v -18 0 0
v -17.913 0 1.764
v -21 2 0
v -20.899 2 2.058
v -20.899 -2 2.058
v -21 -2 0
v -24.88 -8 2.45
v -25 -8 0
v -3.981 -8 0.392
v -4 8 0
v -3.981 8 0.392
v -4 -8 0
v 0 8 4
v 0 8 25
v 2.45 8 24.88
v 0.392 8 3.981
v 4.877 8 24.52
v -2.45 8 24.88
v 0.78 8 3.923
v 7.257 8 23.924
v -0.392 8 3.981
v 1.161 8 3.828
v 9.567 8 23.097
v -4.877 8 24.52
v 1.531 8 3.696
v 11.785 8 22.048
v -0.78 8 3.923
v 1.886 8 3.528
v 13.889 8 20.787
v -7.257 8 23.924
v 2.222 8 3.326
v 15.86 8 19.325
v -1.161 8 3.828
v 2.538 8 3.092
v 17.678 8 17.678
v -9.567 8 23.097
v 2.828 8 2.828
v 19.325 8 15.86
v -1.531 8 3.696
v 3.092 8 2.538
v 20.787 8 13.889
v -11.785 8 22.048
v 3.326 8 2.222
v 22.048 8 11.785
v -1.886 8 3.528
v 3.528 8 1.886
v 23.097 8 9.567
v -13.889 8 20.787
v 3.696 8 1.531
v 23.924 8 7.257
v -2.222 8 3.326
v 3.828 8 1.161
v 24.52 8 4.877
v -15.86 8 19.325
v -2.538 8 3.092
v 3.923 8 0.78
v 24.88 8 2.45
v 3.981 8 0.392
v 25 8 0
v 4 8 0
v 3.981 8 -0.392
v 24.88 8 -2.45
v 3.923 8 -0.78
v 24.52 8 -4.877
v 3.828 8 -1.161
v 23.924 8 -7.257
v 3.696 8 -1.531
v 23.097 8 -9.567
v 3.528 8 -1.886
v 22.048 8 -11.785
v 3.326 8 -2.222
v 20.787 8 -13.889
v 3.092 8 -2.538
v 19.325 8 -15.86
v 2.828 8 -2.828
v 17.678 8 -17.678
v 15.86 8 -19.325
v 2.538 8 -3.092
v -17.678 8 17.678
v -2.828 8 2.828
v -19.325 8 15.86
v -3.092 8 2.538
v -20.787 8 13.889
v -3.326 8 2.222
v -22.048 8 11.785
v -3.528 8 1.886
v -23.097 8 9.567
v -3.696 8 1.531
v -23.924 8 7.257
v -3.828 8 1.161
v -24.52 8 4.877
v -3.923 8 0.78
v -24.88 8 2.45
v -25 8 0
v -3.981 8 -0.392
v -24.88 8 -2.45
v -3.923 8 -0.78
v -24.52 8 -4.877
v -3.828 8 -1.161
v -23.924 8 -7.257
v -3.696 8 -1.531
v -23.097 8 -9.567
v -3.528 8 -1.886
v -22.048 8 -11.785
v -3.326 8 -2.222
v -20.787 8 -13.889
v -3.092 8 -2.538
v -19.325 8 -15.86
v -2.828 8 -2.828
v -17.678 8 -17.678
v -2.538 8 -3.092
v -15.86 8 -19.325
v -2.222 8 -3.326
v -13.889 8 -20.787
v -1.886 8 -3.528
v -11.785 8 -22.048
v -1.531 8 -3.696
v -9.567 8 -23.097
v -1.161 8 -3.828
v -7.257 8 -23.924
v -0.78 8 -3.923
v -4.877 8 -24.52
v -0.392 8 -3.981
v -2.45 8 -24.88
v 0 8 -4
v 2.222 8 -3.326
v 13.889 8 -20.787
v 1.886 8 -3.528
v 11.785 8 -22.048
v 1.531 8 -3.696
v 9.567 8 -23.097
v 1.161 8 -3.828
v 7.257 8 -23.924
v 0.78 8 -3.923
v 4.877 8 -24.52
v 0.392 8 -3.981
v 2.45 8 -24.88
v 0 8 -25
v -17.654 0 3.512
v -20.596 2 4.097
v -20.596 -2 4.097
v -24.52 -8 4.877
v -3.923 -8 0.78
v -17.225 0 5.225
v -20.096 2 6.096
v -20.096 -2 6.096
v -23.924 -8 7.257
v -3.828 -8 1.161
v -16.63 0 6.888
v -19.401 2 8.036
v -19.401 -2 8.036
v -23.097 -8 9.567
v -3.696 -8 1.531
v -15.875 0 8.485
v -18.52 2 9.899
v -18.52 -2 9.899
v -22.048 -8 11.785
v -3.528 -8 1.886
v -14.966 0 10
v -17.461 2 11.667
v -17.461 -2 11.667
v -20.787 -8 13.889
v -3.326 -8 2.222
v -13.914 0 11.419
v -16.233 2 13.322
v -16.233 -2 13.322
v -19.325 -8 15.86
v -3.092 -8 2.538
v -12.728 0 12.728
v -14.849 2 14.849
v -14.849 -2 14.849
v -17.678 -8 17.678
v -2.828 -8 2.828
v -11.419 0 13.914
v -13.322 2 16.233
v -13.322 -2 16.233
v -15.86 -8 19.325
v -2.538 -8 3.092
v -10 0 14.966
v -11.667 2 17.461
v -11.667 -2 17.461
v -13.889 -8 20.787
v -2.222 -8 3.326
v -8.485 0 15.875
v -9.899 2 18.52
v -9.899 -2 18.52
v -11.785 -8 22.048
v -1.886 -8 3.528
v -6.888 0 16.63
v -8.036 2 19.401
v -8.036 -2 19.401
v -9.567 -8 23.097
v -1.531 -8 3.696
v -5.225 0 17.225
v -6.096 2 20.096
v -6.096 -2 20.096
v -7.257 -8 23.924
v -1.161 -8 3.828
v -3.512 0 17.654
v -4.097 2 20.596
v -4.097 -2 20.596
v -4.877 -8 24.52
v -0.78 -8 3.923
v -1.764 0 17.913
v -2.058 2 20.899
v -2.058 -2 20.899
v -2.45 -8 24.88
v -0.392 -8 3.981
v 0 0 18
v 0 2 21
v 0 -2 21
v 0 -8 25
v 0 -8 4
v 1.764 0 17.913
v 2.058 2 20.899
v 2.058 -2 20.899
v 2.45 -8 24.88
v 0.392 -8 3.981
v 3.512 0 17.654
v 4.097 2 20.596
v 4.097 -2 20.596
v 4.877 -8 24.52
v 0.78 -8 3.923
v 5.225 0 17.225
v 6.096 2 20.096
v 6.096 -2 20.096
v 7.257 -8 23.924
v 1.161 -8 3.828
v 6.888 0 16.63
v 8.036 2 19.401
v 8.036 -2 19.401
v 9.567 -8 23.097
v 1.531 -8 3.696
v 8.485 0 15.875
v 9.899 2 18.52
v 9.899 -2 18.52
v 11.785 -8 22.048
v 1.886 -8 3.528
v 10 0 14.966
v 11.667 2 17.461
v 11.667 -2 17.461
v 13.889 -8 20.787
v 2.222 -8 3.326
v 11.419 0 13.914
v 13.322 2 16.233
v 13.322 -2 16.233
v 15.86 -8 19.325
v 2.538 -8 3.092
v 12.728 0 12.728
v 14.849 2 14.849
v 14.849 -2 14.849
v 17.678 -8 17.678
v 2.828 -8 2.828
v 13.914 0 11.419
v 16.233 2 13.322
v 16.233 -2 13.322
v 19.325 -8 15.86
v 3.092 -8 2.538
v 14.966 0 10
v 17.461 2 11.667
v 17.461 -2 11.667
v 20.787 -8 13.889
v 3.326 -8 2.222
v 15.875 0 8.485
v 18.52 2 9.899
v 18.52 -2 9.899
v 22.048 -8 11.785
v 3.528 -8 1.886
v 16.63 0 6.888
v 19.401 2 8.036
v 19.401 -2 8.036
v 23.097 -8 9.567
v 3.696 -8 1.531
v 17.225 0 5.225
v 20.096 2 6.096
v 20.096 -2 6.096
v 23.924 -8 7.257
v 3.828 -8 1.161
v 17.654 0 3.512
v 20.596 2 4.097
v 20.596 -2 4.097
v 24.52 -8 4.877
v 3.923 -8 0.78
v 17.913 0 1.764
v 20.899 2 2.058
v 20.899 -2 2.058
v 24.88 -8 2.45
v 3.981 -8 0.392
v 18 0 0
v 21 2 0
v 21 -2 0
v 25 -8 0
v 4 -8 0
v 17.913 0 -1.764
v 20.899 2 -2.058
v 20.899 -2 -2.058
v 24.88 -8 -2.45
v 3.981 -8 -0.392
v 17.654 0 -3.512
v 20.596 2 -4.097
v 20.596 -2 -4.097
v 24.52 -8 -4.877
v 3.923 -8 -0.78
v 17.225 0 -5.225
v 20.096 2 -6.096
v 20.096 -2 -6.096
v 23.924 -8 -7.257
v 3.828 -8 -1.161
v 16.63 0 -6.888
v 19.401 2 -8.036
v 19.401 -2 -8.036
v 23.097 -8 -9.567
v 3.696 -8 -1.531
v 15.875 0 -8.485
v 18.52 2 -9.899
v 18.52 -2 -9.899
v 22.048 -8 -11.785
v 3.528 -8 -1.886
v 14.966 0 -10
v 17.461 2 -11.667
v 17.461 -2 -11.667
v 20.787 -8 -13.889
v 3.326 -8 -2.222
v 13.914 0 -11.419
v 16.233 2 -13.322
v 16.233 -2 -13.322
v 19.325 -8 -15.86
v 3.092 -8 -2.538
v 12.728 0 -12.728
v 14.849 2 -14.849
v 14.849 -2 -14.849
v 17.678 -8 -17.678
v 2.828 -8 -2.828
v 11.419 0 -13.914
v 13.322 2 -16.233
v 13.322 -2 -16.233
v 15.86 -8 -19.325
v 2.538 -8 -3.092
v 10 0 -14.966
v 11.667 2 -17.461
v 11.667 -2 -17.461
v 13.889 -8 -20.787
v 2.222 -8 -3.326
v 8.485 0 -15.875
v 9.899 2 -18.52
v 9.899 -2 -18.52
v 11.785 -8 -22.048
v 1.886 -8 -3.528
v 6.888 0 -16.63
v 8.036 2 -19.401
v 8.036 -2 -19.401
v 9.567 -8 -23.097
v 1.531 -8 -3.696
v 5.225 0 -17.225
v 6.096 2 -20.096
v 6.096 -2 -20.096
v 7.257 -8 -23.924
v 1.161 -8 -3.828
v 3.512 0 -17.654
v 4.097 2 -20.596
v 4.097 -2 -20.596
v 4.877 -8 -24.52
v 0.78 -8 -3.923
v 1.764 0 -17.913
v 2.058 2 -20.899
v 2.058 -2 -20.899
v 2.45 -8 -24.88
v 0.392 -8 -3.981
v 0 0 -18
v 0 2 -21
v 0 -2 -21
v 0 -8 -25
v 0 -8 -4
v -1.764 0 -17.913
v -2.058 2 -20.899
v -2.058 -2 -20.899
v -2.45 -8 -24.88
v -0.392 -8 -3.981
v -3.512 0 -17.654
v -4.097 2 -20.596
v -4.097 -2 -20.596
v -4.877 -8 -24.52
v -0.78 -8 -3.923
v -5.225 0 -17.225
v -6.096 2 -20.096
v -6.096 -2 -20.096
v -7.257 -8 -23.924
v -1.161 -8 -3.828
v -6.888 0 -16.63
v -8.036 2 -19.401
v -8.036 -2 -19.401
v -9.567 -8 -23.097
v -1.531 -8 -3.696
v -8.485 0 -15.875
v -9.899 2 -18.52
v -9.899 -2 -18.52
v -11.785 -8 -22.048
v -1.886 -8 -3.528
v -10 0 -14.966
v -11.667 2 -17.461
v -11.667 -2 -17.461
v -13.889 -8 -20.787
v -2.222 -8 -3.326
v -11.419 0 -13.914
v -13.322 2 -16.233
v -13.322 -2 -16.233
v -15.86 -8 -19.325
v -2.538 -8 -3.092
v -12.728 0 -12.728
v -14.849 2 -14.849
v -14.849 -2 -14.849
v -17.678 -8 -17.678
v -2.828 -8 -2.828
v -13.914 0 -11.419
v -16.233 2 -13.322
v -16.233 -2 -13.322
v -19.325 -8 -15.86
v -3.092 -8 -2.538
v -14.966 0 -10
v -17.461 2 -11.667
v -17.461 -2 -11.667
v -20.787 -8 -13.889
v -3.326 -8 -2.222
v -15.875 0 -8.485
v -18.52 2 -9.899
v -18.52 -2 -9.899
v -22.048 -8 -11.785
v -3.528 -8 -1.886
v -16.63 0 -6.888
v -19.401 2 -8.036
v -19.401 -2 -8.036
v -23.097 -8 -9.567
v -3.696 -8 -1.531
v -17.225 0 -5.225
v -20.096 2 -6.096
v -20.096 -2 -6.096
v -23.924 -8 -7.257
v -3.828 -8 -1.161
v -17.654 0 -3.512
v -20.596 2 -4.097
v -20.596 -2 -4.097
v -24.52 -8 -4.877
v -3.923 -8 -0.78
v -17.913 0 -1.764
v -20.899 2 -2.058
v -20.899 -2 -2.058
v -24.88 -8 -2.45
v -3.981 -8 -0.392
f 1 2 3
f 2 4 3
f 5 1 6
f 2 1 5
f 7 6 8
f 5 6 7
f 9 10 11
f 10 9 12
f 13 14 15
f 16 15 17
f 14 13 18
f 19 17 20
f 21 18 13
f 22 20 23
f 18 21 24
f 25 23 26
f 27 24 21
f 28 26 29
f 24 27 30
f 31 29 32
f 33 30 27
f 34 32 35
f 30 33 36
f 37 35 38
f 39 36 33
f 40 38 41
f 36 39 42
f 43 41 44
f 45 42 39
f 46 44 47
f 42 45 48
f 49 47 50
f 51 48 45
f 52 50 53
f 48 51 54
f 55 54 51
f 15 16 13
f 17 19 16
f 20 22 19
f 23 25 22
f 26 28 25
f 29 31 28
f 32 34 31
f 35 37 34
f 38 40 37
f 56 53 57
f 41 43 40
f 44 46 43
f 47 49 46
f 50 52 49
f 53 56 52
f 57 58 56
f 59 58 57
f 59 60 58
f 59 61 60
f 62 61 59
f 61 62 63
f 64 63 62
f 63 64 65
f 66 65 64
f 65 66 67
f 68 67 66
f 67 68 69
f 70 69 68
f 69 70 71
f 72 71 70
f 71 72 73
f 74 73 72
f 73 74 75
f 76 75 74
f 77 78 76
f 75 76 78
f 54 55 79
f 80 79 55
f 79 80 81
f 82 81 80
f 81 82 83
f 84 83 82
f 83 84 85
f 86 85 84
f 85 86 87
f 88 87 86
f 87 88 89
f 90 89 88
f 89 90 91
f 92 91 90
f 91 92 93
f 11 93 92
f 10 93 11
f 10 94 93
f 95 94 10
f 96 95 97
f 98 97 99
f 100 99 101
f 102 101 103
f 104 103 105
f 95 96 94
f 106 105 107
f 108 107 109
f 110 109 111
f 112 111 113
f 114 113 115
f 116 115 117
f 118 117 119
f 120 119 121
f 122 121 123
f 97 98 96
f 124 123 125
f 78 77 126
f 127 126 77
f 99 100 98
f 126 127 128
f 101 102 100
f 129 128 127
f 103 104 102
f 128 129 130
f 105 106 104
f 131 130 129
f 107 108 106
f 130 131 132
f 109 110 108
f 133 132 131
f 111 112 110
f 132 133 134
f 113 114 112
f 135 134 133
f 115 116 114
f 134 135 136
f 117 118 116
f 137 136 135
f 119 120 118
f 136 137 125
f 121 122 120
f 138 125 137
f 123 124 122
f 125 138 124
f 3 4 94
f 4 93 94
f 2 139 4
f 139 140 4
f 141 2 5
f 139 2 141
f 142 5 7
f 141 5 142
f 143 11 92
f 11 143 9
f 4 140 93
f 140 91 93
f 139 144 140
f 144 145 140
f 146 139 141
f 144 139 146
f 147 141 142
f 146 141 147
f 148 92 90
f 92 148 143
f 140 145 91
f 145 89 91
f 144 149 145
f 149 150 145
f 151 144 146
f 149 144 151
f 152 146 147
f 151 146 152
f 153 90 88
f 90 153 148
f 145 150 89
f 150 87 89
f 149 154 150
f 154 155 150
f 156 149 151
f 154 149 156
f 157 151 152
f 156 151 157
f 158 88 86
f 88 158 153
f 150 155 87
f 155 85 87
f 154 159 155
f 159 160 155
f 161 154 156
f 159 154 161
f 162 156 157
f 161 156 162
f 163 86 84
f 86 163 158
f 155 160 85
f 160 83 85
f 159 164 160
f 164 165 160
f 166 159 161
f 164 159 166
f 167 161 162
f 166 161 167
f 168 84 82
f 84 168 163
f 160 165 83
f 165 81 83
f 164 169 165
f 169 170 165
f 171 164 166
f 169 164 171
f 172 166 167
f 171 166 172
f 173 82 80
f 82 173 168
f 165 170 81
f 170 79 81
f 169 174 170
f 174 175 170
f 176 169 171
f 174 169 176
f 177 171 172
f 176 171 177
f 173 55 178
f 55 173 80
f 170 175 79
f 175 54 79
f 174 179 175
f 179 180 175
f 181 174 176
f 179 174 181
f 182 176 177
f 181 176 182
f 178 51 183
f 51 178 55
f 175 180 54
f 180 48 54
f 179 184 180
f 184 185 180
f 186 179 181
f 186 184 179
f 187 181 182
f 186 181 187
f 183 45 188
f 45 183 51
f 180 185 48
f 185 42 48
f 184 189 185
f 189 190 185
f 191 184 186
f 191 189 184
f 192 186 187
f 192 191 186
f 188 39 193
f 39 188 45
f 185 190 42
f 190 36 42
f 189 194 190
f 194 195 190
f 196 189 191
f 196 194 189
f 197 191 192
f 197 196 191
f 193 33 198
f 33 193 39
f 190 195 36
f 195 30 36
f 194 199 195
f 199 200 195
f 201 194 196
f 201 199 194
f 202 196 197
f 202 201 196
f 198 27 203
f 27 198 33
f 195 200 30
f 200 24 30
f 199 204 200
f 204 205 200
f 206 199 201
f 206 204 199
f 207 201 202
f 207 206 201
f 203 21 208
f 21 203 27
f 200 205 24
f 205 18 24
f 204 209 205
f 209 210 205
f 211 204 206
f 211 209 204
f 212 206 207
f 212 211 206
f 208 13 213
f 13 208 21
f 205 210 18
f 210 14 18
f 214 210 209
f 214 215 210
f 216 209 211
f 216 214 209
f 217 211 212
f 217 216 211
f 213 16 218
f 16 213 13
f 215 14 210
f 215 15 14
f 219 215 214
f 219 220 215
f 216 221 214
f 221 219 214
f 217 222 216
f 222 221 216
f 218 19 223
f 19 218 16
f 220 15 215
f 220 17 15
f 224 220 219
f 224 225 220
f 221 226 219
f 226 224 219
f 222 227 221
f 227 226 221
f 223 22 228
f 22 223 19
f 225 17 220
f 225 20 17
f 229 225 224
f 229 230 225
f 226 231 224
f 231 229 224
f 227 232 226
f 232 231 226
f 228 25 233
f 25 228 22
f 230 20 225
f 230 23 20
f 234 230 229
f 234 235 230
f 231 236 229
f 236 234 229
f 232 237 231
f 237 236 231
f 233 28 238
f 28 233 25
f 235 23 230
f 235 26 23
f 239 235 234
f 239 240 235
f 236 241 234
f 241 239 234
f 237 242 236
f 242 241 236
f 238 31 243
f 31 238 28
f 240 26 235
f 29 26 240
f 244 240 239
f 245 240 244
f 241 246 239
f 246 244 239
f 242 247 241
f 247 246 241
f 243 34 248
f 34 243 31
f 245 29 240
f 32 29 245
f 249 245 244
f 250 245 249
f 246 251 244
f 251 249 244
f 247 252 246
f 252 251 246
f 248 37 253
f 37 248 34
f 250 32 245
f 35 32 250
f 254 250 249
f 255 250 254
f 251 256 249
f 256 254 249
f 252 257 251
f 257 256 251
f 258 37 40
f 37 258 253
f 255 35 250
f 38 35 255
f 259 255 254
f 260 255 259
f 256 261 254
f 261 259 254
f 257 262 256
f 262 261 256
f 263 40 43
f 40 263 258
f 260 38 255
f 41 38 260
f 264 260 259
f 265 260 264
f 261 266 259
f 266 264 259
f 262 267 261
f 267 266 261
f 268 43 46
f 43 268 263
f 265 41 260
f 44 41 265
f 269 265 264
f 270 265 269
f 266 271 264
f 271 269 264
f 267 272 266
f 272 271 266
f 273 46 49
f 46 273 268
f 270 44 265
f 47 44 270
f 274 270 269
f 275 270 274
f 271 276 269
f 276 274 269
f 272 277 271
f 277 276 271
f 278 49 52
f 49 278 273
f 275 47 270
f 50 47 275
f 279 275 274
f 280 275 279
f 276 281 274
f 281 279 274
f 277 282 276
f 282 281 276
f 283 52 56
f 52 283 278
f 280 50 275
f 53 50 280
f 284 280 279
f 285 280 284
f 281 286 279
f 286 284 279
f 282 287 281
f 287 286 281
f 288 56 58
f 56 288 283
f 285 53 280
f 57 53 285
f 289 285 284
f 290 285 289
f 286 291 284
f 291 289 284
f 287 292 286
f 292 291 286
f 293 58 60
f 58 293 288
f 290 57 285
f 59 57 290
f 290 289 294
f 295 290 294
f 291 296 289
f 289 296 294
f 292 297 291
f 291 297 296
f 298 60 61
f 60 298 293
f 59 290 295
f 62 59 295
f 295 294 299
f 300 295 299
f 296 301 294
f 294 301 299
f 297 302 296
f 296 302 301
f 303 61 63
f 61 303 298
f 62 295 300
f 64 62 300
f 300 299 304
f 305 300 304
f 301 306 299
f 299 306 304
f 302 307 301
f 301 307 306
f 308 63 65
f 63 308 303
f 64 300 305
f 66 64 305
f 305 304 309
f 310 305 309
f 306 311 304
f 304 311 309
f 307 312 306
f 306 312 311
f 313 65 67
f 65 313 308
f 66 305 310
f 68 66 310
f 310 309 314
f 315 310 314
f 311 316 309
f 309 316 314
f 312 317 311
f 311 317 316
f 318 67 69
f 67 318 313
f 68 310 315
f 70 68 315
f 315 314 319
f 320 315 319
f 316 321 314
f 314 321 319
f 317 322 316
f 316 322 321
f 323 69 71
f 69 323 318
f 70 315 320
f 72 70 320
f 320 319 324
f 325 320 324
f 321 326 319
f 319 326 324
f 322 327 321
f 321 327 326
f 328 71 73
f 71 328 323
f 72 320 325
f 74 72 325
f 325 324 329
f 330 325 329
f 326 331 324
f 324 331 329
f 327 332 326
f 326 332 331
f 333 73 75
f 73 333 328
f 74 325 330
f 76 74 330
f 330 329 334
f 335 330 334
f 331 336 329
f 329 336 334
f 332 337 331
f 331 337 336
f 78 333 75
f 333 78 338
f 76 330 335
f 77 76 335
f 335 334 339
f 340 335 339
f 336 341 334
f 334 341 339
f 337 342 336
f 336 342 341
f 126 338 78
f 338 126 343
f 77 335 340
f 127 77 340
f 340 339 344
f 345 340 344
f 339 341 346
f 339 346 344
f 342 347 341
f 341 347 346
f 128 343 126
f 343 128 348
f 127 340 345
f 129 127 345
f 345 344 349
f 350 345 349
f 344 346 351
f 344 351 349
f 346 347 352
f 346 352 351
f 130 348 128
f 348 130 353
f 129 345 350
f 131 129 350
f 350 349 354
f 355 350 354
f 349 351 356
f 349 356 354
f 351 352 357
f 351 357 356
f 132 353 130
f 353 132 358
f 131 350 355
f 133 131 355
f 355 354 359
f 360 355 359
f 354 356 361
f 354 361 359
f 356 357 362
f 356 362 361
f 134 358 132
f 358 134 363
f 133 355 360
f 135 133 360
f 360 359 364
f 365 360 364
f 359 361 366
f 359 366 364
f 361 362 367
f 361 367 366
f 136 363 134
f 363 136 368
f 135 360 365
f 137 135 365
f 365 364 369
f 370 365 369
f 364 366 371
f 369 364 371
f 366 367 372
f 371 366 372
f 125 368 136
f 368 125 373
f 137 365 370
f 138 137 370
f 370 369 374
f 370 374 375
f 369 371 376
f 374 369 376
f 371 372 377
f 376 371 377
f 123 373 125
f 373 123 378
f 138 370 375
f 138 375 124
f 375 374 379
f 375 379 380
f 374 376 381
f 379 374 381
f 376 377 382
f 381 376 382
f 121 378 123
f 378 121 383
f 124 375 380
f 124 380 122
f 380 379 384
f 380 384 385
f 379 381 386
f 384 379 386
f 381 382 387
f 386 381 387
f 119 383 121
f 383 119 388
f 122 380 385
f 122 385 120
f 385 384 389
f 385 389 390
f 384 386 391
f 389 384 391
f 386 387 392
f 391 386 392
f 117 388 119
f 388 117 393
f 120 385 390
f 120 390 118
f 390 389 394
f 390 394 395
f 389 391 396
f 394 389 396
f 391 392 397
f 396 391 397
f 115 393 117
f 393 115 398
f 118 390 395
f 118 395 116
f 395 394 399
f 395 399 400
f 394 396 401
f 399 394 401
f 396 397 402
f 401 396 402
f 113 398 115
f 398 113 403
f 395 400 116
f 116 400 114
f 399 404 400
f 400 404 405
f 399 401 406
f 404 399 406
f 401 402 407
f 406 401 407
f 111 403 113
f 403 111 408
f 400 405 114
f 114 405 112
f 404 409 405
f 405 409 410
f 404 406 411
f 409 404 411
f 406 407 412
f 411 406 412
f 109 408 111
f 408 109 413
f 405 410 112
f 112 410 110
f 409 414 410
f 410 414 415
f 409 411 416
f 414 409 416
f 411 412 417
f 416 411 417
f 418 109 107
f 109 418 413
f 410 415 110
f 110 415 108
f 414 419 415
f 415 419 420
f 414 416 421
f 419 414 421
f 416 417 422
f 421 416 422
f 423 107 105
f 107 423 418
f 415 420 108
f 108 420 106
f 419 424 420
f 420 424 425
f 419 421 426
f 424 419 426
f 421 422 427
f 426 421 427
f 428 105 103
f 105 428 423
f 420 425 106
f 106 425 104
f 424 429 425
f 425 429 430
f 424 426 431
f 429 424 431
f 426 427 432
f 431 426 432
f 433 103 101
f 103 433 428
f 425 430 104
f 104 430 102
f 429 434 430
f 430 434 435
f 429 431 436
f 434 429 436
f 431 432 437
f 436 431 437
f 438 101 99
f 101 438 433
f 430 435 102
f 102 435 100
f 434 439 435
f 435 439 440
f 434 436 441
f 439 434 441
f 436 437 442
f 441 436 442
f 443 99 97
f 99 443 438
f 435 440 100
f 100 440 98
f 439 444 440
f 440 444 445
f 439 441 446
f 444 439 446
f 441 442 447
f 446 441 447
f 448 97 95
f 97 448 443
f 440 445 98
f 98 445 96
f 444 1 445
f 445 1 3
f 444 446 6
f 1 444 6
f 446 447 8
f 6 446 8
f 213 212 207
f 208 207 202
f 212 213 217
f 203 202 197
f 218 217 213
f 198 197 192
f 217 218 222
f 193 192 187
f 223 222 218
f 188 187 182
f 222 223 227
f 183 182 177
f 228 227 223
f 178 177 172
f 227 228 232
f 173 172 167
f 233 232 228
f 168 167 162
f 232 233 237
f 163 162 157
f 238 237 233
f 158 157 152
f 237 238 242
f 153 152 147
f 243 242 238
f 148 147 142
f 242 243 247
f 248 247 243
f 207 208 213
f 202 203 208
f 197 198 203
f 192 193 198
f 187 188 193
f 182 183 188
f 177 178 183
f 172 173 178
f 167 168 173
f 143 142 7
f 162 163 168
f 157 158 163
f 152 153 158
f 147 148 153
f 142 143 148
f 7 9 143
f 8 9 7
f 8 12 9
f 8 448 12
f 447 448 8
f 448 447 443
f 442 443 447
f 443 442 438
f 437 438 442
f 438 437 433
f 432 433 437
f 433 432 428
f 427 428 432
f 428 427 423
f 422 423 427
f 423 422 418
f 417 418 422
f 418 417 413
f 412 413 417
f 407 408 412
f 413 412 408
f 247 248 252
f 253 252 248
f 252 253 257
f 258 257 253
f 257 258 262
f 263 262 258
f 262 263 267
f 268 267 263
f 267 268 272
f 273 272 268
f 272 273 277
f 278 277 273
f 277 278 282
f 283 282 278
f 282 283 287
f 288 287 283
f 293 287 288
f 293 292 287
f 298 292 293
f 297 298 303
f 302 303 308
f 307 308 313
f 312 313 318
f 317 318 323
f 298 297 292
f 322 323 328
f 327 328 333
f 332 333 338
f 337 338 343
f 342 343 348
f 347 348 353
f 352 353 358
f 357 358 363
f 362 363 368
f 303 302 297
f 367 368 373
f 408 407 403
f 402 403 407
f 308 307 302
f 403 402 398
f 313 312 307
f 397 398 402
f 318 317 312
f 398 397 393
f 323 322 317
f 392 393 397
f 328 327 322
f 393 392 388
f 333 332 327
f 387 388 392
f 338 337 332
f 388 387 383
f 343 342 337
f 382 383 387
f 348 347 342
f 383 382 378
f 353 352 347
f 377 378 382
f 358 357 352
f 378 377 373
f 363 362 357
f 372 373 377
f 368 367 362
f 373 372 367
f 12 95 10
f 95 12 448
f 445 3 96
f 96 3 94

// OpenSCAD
// Generated with SolidPython2 for OpenSCAD task-037
$fn = 64;

difference() {
	rotate(a = [90, 0, 0]) {
		rotate_extrude(angle = 360) {
			polygon(points = [[4, -8], [25, -8], [21, -2], [18, 0], [21, 2], [25, 8], [4, 8]]);
		}
	}
	rotate(a = [90, 0, 0]) {
		cylinder(center = true, h = 20, r = 4);
	}
}
